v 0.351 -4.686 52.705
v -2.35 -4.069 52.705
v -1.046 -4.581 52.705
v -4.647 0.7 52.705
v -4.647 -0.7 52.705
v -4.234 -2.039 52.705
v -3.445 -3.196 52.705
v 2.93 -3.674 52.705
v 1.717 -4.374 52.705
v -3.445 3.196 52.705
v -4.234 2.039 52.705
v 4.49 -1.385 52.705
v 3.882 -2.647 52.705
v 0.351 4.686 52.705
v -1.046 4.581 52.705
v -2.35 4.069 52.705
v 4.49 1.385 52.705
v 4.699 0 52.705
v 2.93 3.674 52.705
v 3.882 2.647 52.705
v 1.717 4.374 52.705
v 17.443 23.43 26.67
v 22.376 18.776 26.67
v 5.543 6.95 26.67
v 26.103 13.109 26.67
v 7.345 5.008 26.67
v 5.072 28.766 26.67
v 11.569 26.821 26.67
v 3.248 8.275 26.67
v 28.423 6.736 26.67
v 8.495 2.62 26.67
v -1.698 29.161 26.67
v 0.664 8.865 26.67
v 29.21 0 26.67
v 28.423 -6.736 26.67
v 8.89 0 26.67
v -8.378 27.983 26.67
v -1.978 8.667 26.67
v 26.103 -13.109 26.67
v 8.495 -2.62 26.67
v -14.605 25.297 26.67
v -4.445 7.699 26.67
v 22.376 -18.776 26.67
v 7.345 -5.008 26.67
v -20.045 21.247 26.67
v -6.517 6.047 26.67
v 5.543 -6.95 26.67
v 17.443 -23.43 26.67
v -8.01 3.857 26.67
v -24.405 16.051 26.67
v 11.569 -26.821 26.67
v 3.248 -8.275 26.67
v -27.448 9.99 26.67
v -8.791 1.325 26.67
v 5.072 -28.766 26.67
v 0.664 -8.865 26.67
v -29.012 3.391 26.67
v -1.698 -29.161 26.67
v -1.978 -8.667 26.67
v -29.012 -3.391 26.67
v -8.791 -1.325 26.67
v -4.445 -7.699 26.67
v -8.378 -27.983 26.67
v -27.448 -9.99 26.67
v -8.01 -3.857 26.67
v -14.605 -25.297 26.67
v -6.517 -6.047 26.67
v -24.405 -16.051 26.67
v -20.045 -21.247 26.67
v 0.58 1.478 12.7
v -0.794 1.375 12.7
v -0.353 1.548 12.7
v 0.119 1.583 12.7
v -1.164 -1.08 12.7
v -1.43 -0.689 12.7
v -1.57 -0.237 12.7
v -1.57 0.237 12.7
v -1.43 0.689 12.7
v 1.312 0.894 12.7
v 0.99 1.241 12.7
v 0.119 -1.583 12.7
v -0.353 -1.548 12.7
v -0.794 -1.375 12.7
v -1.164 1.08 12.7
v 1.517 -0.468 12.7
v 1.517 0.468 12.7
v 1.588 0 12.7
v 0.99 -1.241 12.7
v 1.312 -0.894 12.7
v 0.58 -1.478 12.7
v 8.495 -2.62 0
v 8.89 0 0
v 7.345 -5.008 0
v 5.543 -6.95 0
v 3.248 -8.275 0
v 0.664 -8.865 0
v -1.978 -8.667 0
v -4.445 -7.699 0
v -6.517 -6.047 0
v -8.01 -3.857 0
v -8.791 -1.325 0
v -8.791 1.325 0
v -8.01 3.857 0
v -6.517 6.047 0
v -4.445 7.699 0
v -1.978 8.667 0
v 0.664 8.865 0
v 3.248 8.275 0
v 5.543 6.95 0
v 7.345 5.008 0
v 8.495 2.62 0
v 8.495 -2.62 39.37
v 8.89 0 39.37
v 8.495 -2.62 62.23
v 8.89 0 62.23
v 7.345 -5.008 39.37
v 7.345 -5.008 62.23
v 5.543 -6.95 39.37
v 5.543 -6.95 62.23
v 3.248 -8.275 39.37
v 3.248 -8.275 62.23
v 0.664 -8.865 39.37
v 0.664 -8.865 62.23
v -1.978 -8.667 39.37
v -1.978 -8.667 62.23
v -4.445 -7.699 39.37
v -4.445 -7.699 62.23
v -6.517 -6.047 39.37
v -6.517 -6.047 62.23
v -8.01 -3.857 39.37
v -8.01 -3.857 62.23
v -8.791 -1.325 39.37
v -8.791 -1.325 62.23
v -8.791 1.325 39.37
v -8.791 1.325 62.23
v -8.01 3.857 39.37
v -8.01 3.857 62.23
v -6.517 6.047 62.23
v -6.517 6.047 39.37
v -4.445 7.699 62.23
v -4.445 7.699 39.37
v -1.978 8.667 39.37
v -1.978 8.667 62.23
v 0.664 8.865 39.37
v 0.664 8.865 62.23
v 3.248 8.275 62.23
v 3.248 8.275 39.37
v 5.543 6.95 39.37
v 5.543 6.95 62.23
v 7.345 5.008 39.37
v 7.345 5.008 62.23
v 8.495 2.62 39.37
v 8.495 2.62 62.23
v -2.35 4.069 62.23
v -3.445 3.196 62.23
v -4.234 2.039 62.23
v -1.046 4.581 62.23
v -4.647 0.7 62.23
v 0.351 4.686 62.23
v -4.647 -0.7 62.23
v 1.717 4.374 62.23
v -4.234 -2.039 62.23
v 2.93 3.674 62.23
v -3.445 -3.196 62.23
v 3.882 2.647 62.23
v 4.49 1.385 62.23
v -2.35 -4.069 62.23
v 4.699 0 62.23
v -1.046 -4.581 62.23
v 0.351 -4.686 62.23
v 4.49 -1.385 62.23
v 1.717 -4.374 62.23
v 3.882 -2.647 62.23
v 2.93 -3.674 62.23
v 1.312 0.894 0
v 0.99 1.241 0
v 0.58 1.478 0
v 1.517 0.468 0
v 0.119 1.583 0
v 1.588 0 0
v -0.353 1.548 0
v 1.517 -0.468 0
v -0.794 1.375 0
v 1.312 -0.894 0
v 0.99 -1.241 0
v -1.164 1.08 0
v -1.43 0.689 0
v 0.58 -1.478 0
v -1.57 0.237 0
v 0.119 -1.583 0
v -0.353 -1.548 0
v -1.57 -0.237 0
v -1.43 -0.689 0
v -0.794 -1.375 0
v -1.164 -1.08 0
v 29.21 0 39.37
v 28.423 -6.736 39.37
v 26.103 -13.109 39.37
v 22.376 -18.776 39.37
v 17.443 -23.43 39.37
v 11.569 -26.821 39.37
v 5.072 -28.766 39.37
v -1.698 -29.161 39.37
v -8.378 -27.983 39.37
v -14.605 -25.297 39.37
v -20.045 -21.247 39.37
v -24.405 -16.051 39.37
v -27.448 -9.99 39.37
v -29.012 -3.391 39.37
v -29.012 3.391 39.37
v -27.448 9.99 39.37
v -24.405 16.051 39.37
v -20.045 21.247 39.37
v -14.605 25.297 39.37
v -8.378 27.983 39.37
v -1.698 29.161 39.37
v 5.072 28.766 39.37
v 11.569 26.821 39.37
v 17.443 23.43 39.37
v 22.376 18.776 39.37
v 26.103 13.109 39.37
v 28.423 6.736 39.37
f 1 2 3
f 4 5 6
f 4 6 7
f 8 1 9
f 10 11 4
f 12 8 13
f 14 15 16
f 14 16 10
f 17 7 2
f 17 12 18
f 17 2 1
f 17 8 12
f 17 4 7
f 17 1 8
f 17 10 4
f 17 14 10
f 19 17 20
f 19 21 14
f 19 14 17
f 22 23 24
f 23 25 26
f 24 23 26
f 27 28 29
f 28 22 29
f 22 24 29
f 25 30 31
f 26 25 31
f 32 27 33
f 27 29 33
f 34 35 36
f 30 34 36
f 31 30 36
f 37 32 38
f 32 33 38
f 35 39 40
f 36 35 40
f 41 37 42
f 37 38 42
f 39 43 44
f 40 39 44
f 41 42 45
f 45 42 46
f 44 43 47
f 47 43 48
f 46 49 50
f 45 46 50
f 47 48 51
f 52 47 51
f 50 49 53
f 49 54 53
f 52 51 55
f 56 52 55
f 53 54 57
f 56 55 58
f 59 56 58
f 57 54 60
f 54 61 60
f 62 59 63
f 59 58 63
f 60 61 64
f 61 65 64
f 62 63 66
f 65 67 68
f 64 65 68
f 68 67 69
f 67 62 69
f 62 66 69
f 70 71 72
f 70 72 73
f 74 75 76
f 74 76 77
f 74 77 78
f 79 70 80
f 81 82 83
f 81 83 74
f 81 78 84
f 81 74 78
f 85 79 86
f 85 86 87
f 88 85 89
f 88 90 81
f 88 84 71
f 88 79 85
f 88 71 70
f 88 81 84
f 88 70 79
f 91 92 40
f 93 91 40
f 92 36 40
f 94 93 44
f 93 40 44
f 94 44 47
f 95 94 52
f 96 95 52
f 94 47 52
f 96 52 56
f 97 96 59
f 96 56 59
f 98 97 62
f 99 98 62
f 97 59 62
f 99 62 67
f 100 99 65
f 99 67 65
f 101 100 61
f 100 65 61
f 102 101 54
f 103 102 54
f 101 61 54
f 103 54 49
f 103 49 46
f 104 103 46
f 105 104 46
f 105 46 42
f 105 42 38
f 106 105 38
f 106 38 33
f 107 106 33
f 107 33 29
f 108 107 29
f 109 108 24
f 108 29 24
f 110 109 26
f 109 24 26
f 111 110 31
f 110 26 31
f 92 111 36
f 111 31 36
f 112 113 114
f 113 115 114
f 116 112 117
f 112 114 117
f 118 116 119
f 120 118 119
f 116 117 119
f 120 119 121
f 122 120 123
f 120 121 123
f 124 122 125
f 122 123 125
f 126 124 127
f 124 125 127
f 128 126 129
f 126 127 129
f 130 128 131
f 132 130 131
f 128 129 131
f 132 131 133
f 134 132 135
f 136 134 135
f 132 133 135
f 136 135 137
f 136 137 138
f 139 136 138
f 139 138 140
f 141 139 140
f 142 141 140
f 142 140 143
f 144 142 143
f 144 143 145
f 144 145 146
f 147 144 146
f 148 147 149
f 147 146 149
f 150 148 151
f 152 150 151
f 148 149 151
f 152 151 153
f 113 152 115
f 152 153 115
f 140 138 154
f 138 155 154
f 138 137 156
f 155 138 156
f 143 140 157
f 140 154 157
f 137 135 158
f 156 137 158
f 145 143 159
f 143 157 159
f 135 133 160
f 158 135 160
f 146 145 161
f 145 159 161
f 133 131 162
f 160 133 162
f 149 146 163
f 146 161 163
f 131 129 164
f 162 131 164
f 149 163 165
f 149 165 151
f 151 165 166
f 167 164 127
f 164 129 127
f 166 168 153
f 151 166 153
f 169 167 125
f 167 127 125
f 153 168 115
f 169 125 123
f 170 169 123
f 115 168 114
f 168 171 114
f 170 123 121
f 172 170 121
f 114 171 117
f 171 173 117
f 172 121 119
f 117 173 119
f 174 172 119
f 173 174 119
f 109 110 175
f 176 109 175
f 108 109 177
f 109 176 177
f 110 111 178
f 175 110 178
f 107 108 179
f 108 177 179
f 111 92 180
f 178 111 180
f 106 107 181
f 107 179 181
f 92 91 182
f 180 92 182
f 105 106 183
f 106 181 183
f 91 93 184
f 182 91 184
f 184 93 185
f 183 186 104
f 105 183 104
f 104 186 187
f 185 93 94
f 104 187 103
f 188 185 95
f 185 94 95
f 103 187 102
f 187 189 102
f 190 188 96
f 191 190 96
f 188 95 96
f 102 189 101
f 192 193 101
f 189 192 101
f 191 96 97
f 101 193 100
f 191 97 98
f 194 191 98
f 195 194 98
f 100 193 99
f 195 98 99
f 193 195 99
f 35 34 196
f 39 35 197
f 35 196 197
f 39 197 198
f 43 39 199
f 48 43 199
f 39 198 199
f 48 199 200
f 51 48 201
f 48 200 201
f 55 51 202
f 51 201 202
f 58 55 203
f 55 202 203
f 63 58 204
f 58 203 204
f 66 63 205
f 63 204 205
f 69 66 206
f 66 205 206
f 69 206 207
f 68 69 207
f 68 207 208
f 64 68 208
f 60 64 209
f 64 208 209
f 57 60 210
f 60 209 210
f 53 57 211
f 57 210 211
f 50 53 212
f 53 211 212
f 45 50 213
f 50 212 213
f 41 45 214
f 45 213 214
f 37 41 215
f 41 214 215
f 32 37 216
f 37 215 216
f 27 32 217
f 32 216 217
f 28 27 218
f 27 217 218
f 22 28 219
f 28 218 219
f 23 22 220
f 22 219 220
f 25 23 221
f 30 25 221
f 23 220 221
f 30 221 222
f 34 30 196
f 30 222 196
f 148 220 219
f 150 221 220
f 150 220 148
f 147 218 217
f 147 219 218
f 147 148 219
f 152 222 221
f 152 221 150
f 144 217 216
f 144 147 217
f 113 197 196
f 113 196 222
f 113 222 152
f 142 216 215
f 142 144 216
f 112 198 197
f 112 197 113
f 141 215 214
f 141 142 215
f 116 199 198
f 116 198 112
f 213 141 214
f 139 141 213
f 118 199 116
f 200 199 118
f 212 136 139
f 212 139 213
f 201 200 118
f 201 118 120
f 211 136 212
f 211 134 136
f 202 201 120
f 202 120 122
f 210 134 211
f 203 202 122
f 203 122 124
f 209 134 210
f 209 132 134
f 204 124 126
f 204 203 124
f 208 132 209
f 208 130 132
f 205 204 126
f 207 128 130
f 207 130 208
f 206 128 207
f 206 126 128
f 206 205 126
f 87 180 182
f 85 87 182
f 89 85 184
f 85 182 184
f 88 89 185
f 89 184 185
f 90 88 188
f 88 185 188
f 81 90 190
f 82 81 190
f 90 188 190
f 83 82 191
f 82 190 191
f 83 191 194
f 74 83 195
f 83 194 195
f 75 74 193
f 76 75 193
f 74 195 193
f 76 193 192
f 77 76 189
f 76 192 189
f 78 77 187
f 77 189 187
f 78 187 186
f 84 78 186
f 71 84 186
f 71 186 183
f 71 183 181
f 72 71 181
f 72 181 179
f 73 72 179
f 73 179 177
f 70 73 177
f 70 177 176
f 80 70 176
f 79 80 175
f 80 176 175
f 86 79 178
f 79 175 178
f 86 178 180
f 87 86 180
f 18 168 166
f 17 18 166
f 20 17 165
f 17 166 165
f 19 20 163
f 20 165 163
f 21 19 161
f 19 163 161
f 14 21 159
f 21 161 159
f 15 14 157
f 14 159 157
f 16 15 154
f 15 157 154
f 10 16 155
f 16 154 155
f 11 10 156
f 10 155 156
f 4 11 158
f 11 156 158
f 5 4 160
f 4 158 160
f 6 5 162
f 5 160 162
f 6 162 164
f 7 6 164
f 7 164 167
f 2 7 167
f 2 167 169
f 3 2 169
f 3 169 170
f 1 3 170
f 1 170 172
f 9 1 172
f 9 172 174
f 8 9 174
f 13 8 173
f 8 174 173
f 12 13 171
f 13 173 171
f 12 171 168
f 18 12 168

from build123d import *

# Parameters (mm, degrees)
F0_W     = 20.32
F0_H     = 12.7
F2_R     = 4.699
F3_DEPTH = 9.525
F4_R     = 1.5875
F5_DEPTH = 12.7


with BuildPart() as f1:
    # F0 (on Front) → F1 (revolve)
    with BuildSketch(Plane.XZ):
        Polygon((0, 62.23), (0, 0), (8.89, 0), (8.89, 26.67), (8.89, 39.37), (8.89, 62.23), align=None)
        with Locations((19.05, 33.02)):
            Rectangle(F0_W, F0_H)
    revolve(axis=Axis((0, 0, 31.115), (0, 0, -1)))

    # F2 (on face) → F3 (cut)
    with BuildSketch(Plane.XY.offset(62.23)):
        Circle(F2_R)
    extrude(amount=-F3_DEPTH, mode=Mode.SUBTRACT)

    # F4 (on face) → F5 (cut)
    with BuildSketch(Plane(origin=(0, 0, 0), x_dir=(1, 0, 0), z_dir=(0, 0, -1))):
        Circle(F4_R)
    extrude(amount=-F5_DEPTH, mode=Mode.SUBTRACT)


solid = f1.part
